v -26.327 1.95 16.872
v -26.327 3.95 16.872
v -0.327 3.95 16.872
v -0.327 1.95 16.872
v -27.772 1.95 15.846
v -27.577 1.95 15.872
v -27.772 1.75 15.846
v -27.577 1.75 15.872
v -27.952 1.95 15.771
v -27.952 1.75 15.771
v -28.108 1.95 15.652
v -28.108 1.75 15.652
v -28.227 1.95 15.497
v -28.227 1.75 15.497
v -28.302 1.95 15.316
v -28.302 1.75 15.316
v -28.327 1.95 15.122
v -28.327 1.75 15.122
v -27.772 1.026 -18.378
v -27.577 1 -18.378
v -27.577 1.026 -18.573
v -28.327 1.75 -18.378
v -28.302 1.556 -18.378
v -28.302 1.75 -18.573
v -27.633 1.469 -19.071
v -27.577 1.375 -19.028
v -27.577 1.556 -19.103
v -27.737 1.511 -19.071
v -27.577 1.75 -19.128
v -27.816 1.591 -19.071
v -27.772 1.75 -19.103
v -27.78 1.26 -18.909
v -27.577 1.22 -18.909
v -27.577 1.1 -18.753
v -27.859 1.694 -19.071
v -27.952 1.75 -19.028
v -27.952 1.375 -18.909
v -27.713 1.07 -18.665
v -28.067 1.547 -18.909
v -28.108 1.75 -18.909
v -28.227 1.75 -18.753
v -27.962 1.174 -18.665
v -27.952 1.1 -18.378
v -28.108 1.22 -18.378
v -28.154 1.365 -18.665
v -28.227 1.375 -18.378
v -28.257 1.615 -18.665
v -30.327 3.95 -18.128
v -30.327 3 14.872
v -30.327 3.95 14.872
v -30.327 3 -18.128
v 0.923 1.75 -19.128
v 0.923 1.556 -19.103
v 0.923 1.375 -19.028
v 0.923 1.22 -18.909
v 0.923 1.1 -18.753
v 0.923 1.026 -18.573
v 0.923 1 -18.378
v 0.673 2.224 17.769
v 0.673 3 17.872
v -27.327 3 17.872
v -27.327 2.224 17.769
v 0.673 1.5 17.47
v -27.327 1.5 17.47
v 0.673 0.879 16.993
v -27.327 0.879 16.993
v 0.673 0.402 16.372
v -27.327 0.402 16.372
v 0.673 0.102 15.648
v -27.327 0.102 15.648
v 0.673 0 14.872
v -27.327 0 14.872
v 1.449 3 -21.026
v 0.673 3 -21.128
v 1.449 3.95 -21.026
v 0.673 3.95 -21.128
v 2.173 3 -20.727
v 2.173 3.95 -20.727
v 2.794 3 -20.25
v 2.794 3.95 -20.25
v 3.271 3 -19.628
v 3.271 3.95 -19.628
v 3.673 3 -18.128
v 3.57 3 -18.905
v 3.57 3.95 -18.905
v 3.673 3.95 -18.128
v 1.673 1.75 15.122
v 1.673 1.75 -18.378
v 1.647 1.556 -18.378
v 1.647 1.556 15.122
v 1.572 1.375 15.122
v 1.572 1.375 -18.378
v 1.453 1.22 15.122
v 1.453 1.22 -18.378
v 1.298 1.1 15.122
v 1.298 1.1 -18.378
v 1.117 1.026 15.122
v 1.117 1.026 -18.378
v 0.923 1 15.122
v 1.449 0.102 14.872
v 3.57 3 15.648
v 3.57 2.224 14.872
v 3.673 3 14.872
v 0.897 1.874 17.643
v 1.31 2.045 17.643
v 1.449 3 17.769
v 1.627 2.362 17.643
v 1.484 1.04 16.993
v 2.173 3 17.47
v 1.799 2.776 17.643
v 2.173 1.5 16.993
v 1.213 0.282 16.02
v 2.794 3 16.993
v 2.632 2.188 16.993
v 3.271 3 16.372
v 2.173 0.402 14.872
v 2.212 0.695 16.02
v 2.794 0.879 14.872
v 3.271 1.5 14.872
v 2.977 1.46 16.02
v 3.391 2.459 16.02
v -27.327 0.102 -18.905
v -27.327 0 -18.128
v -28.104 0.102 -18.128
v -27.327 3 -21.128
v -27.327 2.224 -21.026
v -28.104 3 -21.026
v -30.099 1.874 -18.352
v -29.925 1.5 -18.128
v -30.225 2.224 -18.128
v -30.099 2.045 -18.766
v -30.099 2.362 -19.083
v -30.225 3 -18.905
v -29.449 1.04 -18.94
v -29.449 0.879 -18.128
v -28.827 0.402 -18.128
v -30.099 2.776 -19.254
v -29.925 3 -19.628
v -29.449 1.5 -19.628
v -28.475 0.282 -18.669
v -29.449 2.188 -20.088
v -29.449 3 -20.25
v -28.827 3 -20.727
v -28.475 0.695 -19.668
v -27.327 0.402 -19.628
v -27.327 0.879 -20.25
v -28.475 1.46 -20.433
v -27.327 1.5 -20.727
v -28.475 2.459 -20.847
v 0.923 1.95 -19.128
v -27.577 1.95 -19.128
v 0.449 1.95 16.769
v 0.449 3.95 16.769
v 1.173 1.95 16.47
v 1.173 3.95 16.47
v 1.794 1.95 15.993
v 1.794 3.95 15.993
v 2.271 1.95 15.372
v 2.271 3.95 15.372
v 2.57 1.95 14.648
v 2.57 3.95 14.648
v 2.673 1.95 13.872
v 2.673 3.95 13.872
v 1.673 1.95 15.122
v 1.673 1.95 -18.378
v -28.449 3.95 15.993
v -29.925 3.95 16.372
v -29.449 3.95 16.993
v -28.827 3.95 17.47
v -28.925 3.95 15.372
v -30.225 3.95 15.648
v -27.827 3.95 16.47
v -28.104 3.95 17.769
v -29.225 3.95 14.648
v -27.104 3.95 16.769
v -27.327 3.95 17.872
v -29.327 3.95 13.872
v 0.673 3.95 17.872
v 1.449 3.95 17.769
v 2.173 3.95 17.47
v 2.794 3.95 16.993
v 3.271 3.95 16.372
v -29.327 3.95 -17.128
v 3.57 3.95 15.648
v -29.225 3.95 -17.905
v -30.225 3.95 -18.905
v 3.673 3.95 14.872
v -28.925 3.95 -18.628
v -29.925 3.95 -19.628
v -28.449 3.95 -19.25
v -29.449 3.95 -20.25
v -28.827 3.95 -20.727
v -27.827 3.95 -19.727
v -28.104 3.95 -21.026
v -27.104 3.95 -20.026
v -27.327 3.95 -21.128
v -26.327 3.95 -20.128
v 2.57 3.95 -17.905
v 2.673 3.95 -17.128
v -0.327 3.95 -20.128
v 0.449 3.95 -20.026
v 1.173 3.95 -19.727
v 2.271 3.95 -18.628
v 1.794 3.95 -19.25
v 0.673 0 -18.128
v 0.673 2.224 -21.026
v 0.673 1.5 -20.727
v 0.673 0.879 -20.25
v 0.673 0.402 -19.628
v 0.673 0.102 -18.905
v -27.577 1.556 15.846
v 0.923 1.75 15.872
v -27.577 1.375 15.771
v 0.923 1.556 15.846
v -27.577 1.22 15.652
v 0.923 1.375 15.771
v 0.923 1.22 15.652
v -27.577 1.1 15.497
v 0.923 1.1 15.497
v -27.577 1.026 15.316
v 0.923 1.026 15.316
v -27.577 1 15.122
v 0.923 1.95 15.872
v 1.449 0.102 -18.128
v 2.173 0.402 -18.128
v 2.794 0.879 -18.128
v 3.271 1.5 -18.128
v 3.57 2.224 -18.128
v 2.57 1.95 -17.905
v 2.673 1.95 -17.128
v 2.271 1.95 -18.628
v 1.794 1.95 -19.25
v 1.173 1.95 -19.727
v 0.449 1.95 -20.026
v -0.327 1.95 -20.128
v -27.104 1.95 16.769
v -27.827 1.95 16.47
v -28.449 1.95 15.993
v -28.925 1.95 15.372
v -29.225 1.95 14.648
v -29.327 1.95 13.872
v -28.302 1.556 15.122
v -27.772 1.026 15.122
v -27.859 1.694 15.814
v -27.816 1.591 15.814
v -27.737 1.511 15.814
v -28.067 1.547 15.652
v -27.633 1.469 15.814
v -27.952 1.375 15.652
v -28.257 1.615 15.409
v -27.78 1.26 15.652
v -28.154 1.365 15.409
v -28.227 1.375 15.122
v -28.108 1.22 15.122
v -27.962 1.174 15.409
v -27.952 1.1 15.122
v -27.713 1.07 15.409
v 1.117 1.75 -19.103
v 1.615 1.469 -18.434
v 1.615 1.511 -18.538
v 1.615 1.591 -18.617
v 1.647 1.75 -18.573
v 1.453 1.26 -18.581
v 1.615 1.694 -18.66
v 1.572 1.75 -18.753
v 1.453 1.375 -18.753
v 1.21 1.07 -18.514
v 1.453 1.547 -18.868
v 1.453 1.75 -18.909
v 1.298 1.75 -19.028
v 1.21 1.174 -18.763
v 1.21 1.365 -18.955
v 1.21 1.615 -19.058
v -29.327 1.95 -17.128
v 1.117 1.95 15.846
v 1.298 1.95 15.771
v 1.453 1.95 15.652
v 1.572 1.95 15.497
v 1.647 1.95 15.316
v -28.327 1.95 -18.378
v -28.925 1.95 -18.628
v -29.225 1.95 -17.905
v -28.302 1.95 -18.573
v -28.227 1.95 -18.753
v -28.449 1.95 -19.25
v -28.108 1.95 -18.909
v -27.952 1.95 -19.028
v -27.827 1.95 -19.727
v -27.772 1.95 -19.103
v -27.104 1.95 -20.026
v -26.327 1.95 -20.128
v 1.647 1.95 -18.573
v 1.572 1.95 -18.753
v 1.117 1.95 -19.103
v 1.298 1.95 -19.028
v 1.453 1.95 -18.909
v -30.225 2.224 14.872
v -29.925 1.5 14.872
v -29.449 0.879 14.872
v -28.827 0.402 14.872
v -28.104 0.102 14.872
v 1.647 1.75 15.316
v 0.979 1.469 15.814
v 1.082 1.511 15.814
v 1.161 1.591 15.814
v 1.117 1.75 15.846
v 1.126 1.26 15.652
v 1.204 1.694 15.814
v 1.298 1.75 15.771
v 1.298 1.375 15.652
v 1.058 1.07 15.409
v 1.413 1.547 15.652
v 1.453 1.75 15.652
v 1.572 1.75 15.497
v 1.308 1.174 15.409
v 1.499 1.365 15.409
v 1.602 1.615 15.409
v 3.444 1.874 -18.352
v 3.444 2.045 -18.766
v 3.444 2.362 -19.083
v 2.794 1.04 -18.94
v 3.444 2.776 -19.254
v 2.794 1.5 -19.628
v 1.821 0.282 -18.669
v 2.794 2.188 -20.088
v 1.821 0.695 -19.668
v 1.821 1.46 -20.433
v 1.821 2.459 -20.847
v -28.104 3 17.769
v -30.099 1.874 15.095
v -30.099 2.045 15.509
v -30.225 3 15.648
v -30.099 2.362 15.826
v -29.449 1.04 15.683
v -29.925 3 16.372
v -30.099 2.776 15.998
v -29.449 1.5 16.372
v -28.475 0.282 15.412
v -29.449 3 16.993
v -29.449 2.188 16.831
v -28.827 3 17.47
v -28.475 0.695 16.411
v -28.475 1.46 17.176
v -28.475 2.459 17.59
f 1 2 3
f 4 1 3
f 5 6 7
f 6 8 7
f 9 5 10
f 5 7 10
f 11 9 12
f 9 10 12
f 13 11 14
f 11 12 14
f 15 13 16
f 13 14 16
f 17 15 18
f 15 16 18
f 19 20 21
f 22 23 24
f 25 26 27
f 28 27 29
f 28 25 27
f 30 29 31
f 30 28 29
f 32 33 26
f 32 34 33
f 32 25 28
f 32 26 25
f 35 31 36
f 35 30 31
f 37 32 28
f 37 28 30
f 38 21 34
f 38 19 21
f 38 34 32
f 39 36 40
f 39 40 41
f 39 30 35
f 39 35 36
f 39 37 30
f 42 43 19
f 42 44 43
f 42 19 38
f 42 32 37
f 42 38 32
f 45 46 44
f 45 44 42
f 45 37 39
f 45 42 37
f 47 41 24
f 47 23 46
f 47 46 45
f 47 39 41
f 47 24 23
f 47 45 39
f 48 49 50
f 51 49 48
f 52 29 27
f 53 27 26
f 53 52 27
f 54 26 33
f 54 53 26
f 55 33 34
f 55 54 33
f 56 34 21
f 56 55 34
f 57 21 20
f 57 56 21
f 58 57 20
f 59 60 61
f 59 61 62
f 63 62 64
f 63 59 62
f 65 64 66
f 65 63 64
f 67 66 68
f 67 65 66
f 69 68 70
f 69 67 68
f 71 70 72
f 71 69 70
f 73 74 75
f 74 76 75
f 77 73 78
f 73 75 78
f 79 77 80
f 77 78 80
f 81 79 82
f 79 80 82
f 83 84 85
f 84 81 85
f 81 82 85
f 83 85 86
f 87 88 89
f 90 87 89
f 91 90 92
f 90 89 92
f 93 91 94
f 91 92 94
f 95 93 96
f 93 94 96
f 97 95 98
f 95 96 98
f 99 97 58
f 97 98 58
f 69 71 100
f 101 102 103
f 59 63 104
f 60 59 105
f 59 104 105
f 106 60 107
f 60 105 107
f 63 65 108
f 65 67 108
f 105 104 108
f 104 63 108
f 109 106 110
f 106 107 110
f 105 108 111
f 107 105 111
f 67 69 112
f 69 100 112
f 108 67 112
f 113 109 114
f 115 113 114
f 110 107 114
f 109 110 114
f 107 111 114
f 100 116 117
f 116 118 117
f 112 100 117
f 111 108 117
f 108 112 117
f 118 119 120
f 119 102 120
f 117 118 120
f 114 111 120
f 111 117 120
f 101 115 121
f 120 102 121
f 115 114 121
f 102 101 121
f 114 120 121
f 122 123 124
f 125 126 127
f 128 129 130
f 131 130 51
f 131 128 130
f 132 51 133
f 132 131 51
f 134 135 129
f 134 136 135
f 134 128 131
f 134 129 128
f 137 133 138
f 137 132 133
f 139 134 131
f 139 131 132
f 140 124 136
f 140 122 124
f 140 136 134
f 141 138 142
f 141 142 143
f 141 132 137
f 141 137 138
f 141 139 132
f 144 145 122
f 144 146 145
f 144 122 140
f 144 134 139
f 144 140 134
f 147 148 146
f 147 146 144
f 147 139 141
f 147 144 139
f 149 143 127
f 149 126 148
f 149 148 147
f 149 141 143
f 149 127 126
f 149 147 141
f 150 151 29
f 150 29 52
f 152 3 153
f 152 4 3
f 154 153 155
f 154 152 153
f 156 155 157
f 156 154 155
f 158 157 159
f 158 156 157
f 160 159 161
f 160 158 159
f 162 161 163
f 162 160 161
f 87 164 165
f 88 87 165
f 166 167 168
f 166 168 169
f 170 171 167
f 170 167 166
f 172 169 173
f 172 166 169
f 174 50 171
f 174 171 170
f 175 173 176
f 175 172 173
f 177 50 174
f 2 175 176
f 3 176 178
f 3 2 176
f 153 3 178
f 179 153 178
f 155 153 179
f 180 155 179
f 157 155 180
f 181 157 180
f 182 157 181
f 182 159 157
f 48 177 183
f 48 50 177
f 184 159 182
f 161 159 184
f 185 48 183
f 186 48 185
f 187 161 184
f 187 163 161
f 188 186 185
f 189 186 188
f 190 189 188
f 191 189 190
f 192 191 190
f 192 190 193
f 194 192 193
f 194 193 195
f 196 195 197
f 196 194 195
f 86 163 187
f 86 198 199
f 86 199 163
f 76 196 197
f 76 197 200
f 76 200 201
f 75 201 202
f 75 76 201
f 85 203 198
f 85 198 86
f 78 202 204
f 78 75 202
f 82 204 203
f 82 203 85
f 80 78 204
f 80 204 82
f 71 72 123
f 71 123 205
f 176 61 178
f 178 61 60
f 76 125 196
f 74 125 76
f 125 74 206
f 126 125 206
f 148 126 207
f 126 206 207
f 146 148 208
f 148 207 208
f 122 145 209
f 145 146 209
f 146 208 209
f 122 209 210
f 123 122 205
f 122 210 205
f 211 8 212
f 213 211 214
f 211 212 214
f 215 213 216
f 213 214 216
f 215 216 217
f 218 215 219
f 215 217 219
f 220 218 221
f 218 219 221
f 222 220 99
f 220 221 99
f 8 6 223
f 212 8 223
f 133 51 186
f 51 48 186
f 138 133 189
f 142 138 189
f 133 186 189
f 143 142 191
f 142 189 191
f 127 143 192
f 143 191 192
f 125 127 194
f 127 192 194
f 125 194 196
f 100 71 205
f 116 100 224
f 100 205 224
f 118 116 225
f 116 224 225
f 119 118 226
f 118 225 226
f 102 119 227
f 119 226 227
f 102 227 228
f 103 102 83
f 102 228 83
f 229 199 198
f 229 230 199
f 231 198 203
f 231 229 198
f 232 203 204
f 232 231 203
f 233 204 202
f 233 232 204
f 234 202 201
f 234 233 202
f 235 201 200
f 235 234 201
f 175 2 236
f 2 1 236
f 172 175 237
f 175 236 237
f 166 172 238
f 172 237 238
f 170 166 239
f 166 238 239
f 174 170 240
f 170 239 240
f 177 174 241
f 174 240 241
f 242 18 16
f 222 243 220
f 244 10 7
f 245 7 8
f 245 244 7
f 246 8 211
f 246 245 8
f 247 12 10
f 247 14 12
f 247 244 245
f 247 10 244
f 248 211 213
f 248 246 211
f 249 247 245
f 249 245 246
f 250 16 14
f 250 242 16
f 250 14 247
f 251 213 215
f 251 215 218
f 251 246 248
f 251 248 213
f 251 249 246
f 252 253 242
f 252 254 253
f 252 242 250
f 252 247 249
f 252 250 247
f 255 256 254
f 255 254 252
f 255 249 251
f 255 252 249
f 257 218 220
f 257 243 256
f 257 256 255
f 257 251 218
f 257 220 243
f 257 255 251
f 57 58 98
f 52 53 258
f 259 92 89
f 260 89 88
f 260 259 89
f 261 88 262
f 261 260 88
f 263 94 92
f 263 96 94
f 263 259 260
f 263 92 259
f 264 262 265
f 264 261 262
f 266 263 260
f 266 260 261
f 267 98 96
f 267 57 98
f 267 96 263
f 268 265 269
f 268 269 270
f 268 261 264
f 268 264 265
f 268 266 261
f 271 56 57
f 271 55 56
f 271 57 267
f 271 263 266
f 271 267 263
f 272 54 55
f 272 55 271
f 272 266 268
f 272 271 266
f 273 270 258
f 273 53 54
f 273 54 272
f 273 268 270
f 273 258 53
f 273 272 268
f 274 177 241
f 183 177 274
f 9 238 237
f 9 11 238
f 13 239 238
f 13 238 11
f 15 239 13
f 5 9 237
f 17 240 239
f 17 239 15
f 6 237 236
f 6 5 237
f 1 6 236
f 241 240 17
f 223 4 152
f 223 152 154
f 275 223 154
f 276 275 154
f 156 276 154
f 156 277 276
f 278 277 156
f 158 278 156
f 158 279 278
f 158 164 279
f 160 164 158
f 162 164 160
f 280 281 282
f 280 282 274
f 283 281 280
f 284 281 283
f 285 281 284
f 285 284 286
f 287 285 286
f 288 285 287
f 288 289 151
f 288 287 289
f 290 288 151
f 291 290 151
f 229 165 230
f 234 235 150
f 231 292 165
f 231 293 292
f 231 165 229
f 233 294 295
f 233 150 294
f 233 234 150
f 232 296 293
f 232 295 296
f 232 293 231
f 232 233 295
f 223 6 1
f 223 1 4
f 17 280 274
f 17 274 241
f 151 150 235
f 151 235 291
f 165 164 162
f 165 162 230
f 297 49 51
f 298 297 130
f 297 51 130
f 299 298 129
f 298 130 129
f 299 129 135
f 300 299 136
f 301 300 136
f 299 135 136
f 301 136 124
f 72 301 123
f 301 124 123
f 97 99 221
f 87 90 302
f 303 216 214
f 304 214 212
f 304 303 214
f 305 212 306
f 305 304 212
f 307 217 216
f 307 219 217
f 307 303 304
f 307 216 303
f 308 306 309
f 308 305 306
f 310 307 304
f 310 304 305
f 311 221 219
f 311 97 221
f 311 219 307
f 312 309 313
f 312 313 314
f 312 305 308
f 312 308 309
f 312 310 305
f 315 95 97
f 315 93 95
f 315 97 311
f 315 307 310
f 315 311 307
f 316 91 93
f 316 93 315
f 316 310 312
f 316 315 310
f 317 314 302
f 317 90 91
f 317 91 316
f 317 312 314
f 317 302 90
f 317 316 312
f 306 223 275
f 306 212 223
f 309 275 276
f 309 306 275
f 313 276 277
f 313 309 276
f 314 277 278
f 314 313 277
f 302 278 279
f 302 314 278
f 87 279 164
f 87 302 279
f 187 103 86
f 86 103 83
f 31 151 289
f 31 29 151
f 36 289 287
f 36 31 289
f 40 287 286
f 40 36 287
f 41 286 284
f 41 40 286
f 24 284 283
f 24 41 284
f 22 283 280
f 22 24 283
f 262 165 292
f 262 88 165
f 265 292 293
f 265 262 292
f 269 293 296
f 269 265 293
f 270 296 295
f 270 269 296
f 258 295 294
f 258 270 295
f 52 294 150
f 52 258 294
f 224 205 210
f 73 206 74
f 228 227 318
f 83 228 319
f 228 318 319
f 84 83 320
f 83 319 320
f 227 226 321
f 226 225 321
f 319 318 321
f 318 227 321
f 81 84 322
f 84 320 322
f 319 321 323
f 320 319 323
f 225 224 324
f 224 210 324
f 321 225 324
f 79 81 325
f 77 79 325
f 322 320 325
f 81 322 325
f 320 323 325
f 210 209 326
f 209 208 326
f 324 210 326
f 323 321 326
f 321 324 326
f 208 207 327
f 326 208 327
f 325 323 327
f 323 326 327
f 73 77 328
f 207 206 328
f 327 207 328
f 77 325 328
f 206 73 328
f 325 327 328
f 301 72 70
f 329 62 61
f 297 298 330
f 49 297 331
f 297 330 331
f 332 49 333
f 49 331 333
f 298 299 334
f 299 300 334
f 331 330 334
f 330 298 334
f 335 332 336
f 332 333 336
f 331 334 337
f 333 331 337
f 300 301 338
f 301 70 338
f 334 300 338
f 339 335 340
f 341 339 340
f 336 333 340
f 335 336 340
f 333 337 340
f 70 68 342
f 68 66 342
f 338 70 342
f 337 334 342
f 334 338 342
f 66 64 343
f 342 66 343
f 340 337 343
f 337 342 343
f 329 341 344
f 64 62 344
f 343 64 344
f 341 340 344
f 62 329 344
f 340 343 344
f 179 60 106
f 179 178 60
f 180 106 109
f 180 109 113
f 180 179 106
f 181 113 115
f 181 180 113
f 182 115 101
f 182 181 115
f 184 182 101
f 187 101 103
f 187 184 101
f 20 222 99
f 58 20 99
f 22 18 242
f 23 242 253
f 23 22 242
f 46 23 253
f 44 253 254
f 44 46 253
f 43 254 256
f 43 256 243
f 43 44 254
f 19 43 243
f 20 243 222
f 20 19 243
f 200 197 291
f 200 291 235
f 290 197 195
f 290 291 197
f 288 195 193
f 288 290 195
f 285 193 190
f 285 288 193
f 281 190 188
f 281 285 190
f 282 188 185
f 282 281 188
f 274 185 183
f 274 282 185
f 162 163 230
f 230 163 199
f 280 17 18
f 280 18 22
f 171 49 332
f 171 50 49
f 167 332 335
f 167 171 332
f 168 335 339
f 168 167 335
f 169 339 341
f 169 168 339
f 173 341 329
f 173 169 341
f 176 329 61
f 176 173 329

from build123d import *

# Parameters (mm, degrees)
SCHIZZO1_W                   = 34
SCHIZZO1_H                   = 39
ESTRUSIONE_ESTRUSIONE1_DEPTH = 3.95
SCHIZZO2_W                   = 32
SCHIZZO2_H                   = 37
TAGLIO_ESTRUSIONE1_DEPTH     = 2
SCHIZZO3_W                   = 30
SCHIZZO3_H                   = 35
TAGLIO_ESTRUSIONE2_DEPTH     = 0.95
RACCORDO1_R                  = 3
RACCORDO2_R                  = 0.75


with BuildPart() as part:
    # Schizzo1 → Estrusione-Estrusione1 (new body)
    with BuildSketch(Plane(origin=(0, 0, 0), x_dir=(1, 0, 0), z_dir=(0, 1, 0))):
        with Locations((-13.327421164, 1.628483957)):
            Rectangle(SCHIZZO1_W, SCHIZZO1_H)
    extrude(amount=ESTRUSIONE_ESTRUSIONE1_DEPTH)

    # Schizzo2 → Taglio-Estrusione1 (cut)
    with BuildSketch(Plane(origin=(0, 3.95, 0), x_dir=(1, 0, 0), z_dir=(0, 1, 0))):
        with Locations((-13.327421164, 1.628483957)):
            Rectangle(SCHIZZO2_W, SCHIZZO2_H)
    extrude(amount=-TAGLIO_ESTRUSIONE1_DEPTH, mode=Mode.SUBTRACT)

    # Schizzo3 → Taglio-Estrusione2 (cut)
    with BuildSketch(Plane(origin=(0, 1.95, 0), x_dir=(1, 0, 0), z_dir=(0, 1, 0))):
        with Locations((-13.327421164, 1.628483957)):
            Rectangle(SCHIZZO3_W, SCHIZZO3_H)
    extrude(amount=-TAGLIO_ESTRUSIONE2_DEPTH, mode=Mode.SUBTRACT)

    # Raccordo1
    raccordo1_edges = [part.edges().sort_by_distance(p)[0] for p in [
        (-29.327421164, 2.95, 16.871516043),
        (-29.327421164, 2.95, -20.128483957),
        (2.672578836, 2.95, -20.128483957),
        (2.672578836, 2.95, 16.871516043),
        (-13.327421164, 0, -21.128483957),
        (3.672578836, 0, -1.628483957),
        (-13.327421164, 0, 17.871516043),
        (-30.327421164, 0, -1.628483957),
        (-30.327421164, 1.975, -21.128483957),
        (3.672578836, 1.975, -21.128483957),
        (3.672578836, 1.975, 17.871516043),
        (-30.327421164, 1.975, 17.871516043),
    ]]
    fillet(raccordo1_edges, radius=RACCORDO1_R)

    # Raccordo2
    raccordo2_edges = [part.edges().sort_by_distance(p)[0] for p in [
        (-28.327421164, 1, -1.628483957),
        (-28.327421164, 1.475, 15.871516043),
        (-13.327421164, 1, -19.128483957),
        (-28.327421164, 1.475, -19.128483957),
        (1.672578836, 1, -1.628483957),
        (1.672578836, 1.475, -19.128483957),
        (-13.327421164, 1, 15.871516043),
        (1.672578836, 1.475, 15.871516043),
    ]]
    fillet(raccordo2_edges, radius=RACCORDO2_R)


solid = part.part
